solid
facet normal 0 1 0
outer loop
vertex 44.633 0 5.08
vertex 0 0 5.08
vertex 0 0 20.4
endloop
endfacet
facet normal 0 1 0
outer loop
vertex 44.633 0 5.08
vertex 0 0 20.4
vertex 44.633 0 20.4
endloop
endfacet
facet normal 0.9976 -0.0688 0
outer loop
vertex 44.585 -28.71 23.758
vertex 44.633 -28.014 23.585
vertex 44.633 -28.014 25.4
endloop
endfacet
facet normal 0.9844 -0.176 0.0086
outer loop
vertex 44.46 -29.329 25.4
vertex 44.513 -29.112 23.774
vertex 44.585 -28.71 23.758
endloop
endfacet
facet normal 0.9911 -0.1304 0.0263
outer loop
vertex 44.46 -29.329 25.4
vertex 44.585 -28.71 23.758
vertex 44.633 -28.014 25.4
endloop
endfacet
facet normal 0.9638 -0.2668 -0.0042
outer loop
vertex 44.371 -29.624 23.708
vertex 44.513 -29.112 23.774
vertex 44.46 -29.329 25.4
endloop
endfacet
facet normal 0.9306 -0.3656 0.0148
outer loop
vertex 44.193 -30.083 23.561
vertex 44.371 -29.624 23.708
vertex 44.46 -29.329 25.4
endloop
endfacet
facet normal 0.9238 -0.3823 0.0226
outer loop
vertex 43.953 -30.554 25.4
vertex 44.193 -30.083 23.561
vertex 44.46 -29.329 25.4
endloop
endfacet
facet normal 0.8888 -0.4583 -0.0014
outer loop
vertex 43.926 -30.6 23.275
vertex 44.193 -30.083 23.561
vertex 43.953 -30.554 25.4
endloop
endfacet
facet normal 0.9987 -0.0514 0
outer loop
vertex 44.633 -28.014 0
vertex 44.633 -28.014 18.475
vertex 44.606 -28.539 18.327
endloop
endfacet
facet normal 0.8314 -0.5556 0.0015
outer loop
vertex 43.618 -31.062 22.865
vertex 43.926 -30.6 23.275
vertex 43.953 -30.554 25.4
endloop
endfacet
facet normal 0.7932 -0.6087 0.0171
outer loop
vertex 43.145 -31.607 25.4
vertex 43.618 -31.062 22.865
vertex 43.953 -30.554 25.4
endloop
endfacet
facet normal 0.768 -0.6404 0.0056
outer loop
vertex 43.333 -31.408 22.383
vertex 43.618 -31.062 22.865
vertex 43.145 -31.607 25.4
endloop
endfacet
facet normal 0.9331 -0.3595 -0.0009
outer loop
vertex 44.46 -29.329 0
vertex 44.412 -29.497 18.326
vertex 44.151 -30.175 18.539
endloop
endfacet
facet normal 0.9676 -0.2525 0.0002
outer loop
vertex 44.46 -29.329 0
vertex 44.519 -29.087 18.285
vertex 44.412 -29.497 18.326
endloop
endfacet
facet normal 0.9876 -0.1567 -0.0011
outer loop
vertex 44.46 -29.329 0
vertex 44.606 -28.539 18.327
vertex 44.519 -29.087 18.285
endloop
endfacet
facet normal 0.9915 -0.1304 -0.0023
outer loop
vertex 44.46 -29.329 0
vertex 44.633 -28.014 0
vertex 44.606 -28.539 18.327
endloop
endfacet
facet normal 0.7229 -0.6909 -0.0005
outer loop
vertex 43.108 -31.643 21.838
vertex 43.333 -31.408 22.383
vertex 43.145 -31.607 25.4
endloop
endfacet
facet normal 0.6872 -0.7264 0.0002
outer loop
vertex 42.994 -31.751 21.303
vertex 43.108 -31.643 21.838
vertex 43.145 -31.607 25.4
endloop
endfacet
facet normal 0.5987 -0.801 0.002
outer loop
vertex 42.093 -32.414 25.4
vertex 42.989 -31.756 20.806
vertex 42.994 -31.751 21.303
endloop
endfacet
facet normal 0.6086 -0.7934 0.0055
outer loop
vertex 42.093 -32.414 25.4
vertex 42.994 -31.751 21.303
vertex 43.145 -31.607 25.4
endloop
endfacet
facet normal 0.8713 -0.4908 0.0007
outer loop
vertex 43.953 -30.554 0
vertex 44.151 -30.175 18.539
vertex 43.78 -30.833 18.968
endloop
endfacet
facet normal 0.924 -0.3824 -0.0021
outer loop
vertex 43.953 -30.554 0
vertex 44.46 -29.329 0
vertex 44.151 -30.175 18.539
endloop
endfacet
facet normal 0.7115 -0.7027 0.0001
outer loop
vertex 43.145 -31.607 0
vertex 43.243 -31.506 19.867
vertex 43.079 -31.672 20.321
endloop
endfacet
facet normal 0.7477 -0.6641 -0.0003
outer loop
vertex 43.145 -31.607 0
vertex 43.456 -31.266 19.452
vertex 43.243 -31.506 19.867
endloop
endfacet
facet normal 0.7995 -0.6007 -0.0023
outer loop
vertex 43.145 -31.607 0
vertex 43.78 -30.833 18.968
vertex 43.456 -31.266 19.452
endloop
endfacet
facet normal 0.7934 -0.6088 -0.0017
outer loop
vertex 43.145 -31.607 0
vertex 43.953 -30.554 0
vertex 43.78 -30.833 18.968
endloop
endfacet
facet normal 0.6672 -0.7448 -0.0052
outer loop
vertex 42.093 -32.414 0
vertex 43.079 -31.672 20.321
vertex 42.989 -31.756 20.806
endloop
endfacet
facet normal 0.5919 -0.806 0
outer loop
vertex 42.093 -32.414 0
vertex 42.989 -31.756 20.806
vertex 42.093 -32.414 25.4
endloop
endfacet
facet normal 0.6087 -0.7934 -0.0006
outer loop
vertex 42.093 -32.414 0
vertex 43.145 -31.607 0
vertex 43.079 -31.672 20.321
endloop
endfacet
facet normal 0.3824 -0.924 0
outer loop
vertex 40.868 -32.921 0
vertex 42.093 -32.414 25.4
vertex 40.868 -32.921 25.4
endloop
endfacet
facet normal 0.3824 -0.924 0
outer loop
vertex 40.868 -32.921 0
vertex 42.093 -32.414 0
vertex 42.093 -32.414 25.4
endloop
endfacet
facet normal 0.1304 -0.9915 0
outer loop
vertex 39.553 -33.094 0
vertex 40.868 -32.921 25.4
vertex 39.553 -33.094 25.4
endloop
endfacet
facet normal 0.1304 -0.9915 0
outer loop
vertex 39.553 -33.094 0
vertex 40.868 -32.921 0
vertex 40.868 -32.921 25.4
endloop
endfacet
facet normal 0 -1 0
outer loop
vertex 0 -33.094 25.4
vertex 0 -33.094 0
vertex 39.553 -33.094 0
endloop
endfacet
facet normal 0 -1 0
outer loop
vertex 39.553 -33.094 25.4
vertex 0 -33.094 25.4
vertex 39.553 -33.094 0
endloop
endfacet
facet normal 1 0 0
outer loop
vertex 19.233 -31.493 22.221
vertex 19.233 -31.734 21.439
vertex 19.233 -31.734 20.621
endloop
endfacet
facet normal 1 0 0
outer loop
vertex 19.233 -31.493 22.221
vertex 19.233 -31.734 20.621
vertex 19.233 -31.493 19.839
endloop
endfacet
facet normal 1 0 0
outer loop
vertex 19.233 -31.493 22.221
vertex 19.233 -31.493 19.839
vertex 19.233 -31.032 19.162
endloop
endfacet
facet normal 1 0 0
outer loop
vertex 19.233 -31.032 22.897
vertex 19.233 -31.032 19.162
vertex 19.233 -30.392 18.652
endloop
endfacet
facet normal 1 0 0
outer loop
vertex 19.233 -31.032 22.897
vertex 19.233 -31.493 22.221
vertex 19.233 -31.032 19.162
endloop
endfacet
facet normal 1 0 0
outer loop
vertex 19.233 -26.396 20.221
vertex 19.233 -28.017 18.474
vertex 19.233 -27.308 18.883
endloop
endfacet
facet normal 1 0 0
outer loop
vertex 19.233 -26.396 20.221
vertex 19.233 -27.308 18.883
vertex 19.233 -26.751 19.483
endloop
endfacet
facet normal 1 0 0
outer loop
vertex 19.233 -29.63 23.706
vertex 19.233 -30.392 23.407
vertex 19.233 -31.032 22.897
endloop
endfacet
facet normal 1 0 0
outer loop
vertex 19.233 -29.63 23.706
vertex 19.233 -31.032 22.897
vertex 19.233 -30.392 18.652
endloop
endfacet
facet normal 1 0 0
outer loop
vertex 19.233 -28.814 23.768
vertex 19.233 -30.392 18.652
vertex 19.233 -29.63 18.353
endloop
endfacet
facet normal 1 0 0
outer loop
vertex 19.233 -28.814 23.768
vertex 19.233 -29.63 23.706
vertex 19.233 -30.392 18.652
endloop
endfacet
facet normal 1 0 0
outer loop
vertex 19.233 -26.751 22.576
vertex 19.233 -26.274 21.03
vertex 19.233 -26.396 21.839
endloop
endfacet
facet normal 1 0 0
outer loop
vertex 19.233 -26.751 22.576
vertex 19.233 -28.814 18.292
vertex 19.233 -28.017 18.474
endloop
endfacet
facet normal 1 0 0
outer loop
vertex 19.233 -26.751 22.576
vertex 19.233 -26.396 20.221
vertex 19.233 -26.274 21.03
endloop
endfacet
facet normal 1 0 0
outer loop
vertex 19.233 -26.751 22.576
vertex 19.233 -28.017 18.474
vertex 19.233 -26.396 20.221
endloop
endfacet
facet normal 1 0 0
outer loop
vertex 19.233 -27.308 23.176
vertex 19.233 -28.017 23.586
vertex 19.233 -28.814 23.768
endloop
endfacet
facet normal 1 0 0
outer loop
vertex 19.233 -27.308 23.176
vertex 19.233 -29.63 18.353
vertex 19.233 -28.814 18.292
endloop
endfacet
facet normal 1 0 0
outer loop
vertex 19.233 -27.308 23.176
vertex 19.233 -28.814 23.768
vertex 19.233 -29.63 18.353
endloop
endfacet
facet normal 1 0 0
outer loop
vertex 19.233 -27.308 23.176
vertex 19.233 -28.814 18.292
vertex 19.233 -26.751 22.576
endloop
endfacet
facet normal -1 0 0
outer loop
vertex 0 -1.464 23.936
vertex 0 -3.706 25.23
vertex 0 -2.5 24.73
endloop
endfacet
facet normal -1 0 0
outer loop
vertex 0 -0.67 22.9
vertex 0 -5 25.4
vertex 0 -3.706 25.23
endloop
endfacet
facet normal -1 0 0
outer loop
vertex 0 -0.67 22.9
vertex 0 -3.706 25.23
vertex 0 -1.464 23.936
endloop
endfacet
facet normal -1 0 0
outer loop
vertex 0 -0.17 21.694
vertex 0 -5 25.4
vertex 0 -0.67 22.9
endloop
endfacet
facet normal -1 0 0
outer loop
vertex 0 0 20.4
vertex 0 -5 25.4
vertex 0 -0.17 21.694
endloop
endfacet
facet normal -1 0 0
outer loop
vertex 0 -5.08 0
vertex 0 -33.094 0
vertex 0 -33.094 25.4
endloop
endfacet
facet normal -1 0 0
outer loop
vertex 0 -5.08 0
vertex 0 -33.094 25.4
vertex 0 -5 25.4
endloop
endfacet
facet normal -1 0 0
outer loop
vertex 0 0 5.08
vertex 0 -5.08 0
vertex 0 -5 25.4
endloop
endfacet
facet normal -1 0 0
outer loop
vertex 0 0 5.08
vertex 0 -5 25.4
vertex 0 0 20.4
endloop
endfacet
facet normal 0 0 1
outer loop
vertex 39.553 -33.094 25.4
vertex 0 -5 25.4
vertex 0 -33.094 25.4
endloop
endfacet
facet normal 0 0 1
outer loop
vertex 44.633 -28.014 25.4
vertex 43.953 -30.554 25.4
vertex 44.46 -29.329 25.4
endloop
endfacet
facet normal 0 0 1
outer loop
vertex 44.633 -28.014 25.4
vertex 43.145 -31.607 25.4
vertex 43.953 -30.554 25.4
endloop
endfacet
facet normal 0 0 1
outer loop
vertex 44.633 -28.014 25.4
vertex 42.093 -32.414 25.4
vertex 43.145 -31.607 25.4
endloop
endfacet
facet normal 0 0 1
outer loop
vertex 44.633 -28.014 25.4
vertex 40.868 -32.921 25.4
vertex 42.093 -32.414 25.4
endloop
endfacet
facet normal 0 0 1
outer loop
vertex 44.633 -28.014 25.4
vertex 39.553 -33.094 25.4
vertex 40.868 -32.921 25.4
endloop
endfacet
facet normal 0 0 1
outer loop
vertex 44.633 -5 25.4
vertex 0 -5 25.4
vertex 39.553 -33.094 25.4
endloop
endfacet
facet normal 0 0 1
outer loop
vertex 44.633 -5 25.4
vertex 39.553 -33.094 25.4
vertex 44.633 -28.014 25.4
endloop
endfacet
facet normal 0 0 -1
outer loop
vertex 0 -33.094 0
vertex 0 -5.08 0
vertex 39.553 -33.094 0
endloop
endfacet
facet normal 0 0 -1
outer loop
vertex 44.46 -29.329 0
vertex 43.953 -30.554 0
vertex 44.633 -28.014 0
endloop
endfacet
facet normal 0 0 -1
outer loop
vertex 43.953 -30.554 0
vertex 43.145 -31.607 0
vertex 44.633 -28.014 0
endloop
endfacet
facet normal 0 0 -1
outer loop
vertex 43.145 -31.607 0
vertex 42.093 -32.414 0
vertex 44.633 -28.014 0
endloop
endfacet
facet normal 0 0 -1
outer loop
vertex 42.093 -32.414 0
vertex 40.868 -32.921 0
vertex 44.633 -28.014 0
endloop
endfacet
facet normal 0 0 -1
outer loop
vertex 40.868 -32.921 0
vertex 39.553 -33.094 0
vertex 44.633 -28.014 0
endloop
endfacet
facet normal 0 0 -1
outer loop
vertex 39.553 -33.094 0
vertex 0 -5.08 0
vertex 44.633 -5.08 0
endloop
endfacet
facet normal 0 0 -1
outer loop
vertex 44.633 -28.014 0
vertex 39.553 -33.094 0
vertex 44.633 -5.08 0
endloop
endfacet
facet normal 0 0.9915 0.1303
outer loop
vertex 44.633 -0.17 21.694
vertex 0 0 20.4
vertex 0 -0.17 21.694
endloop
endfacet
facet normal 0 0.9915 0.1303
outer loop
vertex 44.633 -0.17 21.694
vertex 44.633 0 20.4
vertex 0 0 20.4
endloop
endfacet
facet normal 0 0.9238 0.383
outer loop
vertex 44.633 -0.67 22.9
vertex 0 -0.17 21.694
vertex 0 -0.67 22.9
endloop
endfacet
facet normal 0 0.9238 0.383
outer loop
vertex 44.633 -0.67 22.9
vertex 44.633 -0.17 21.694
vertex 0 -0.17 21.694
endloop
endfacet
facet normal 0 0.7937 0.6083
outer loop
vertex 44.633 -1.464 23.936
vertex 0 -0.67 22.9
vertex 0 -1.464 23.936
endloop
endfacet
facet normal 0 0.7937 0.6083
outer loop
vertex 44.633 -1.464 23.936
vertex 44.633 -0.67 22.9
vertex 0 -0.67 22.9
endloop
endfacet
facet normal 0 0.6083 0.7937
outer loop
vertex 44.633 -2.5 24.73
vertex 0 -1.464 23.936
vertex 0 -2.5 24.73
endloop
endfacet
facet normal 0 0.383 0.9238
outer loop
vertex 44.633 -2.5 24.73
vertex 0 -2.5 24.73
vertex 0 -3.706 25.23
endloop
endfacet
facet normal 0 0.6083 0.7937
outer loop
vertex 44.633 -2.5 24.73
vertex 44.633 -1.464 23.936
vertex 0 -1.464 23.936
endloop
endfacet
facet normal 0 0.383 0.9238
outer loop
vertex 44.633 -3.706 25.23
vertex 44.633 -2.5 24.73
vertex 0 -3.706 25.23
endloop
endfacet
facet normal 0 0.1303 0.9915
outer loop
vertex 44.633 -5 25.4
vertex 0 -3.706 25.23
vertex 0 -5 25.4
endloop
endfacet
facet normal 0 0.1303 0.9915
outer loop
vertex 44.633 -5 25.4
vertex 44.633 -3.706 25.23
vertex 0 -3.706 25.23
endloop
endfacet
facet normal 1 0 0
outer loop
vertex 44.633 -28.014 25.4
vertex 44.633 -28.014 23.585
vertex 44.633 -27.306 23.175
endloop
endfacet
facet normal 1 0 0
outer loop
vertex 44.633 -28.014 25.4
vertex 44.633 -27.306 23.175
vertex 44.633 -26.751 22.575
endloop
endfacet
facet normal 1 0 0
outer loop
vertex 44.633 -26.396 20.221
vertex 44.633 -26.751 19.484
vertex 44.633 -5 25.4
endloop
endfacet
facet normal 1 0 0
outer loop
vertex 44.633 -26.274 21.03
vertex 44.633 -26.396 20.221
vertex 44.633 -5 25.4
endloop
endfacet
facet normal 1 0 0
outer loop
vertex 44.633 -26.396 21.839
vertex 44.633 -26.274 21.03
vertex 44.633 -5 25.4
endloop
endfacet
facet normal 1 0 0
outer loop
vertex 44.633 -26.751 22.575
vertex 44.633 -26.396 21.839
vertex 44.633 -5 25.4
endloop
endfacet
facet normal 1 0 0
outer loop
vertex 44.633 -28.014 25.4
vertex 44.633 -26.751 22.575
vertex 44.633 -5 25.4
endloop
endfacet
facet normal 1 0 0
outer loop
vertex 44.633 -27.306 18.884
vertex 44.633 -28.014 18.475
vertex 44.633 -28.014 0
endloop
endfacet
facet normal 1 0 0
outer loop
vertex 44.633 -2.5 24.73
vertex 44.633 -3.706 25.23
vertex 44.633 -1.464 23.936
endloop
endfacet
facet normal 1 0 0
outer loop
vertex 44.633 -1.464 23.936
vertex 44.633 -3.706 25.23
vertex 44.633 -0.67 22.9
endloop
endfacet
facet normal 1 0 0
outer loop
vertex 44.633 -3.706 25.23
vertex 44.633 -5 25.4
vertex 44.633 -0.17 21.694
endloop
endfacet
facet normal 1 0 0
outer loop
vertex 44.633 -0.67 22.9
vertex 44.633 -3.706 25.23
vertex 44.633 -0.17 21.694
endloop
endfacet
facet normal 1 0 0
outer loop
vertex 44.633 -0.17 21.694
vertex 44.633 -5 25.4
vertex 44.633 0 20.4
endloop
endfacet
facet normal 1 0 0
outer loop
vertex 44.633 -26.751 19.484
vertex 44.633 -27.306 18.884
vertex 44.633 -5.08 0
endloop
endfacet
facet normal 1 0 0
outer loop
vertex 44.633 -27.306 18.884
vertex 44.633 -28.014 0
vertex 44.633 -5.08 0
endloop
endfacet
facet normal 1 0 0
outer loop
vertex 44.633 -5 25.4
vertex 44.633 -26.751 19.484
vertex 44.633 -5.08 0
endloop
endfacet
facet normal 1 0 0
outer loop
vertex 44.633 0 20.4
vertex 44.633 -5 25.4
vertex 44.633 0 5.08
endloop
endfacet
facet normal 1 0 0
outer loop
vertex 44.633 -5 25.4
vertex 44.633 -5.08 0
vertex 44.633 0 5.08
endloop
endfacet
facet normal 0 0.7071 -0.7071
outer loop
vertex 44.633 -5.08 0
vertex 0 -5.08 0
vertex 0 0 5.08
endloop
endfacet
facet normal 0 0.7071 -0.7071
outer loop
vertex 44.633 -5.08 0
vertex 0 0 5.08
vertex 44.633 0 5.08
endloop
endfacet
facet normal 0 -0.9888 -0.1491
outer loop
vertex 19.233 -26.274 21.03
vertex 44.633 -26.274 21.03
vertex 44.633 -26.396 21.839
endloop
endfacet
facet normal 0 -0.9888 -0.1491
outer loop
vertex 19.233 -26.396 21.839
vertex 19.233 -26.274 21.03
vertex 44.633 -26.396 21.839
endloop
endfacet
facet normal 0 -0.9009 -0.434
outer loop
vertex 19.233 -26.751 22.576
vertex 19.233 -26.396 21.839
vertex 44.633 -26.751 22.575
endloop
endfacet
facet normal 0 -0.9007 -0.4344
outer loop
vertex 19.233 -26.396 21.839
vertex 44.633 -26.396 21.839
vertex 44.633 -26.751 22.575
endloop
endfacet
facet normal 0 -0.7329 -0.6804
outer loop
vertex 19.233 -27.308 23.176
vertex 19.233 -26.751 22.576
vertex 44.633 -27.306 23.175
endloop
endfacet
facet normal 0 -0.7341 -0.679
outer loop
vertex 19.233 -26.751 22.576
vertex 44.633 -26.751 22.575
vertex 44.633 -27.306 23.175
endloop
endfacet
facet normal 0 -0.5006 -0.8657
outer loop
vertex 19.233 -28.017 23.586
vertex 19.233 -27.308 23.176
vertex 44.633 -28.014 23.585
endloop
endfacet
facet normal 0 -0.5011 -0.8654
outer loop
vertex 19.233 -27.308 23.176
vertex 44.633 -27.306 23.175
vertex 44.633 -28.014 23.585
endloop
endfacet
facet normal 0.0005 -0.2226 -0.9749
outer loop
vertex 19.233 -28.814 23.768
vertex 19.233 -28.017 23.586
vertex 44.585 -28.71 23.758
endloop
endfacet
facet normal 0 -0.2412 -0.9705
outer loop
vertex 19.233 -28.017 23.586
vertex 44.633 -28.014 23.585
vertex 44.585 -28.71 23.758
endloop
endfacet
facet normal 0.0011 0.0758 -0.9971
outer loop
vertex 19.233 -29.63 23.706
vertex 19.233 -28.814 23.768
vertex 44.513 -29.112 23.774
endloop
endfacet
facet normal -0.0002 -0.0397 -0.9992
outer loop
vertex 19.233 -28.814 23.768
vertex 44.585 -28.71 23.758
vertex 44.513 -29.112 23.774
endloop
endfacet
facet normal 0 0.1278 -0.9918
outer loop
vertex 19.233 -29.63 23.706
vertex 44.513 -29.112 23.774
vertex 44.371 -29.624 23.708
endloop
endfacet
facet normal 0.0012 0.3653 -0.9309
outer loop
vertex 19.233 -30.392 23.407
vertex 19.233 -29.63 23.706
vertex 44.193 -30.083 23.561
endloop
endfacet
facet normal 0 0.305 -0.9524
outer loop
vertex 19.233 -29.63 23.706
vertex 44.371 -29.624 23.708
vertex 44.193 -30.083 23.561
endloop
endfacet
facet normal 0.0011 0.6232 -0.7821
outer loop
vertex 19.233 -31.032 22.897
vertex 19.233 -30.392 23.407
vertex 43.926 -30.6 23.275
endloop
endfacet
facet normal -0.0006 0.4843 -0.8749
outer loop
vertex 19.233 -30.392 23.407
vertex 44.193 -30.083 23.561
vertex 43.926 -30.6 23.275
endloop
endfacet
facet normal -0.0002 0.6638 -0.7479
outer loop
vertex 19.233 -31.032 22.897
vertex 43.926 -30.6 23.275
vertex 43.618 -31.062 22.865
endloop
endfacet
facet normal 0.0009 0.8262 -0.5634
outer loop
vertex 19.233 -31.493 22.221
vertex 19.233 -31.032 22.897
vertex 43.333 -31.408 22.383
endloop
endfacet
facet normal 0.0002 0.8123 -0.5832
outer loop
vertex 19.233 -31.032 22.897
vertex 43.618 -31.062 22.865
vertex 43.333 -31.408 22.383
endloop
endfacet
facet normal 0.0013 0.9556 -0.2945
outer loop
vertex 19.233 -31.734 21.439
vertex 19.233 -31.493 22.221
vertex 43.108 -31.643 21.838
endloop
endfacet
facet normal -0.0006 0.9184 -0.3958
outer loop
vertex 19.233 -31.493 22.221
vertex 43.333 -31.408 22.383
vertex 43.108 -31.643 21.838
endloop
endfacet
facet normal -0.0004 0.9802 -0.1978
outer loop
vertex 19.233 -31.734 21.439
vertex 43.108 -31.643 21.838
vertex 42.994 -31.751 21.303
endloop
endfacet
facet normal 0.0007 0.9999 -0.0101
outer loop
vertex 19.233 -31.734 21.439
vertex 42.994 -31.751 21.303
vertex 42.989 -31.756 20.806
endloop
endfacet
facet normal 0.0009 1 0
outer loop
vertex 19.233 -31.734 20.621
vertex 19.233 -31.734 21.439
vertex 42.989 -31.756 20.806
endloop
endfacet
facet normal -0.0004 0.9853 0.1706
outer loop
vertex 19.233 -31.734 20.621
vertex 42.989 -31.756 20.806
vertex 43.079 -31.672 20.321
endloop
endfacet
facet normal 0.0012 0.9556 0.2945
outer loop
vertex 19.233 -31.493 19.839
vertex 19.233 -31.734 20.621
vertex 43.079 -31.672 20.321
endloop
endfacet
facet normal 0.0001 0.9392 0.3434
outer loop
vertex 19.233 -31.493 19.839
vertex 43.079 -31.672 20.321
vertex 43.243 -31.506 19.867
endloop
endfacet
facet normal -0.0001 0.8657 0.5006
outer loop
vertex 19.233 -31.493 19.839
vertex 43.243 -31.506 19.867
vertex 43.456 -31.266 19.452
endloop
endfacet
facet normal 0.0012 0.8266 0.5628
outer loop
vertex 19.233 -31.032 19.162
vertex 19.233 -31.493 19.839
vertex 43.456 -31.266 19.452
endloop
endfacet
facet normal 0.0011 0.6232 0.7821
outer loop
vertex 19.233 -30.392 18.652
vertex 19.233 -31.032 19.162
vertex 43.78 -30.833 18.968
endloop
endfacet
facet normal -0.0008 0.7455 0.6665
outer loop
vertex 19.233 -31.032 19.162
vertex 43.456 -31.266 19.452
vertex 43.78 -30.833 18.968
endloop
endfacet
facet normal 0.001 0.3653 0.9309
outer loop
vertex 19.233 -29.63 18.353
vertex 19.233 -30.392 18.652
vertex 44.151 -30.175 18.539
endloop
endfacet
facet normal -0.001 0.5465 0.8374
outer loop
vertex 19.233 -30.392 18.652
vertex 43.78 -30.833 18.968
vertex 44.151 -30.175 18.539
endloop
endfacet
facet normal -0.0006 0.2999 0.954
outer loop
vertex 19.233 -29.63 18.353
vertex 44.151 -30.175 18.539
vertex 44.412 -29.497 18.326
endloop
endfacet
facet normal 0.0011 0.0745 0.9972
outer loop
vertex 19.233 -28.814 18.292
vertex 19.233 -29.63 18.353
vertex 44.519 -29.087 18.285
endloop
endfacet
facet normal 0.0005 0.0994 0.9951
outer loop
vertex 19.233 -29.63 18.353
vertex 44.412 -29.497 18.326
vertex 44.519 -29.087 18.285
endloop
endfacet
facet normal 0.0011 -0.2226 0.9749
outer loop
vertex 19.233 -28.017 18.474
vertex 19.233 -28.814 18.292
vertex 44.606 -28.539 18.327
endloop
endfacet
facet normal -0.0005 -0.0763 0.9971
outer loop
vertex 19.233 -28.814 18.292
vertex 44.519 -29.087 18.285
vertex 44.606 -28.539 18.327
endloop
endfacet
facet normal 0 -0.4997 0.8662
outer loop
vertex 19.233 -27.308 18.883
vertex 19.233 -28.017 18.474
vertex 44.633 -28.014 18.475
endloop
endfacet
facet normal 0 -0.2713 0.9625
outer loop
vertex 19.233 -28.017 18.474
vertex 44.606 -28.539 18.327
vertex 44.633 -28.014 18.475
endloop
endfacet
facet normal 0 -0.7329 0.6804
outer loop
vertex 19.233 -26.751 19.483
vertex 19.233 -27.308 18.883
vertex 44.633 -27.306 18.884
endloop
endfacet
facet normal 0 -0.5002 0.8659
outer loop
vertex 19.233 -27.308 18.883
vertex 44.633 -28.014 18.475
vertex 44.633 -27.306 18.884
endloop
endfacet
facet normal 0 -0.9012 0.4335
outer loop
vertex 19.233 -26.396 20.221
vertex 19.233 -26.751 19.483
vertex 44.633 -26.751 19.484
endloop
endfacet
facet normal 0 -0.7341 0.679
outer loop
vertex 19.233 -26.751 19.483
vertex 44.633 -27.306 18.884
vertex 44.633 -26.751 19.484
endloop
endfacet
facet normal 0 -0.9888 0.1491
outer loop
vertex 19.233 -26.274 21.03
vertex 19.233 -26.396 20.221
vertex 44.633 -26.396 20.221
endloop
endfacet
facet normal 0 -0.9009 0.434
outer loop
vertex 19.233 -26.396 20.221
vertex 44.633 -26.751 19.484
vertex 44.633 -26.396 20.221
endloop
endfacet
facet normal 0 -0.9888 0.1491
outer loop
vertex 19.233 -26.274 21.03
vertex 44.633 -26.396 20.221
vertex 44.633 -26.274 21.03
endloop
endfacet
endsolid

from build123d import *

# Parameters (mm, degrees)
F0_W        = 44.6331575513
F0_H        = 33.0944694579
F1_DEPTH    = 25.4
F2_R        = 5
F3_SIZE     = 5.08
F4_R        = 2.7454645763
F5_DEPTH    = 25.4
F6_T1_DEPTH = 50.8


# Not quite as in the source:
# - a fillet or chamfer that OpenCascade refuses, or shapes differently, is made with other operations: its cross-section is extruded or revolved along the edge and cut away or added


with BuildPart() as f1:
    # F0 (on Top) → F1 (new body)
    with BuildSketch(Plane.XY):
        with Locations((22.3165787756, -16.5472347289)):
            Rectangle(F0_W, F0_H)
    extrude(amount=F1_DEPTH)

    # F2
    f2_edges = [f1.edges().sort_by_distance(p)[0] for p in [
        (22.316579, 0, 25.4),
    ]]
    fillet(f2_edges, radius=F2_R)

    # F3
    f3_edges = [f1.edges().sort_by_distance(p)[0] for p in [
        (22.316579, 0, 0),
    ]]
    chamfer(f3_edges, length=F3_SIZE)

    # F4 (on face) → F5 (cut)
    with BuildSketch(Plane.YZ.offset(44.6331575513)):
        with Locations((-29.0195755661, 21.0298281163)):
            Circle(F4_R)
    extrude(amount=-F5_DEPTH, mode=Mode.SUBTRACT)

    # F6: fillet of radius 5.08 on 1 edges, made by hand

    # F6_s2 → F6_t1 (cut)
    with BuildSketch(Plane.XY.offset(-12.7)):
        with BuildLine():
            ThreePointArc((44.6331575513, -28.0144694579), (43.1452599997, -31.6065719063), (39.5531575513, -33.0944694579))
            Line((39.5531575513, -33.0944694579), (44.6331575513, -33.0944694579))
            Line((44.6331575513, -33.0944694579), (44.6331575513, -28.0144694579))
        make_face()
    extrude(amount=F6_T1_DEPTH, mode=Mode.SUBTRACT)


solid = f1.part
